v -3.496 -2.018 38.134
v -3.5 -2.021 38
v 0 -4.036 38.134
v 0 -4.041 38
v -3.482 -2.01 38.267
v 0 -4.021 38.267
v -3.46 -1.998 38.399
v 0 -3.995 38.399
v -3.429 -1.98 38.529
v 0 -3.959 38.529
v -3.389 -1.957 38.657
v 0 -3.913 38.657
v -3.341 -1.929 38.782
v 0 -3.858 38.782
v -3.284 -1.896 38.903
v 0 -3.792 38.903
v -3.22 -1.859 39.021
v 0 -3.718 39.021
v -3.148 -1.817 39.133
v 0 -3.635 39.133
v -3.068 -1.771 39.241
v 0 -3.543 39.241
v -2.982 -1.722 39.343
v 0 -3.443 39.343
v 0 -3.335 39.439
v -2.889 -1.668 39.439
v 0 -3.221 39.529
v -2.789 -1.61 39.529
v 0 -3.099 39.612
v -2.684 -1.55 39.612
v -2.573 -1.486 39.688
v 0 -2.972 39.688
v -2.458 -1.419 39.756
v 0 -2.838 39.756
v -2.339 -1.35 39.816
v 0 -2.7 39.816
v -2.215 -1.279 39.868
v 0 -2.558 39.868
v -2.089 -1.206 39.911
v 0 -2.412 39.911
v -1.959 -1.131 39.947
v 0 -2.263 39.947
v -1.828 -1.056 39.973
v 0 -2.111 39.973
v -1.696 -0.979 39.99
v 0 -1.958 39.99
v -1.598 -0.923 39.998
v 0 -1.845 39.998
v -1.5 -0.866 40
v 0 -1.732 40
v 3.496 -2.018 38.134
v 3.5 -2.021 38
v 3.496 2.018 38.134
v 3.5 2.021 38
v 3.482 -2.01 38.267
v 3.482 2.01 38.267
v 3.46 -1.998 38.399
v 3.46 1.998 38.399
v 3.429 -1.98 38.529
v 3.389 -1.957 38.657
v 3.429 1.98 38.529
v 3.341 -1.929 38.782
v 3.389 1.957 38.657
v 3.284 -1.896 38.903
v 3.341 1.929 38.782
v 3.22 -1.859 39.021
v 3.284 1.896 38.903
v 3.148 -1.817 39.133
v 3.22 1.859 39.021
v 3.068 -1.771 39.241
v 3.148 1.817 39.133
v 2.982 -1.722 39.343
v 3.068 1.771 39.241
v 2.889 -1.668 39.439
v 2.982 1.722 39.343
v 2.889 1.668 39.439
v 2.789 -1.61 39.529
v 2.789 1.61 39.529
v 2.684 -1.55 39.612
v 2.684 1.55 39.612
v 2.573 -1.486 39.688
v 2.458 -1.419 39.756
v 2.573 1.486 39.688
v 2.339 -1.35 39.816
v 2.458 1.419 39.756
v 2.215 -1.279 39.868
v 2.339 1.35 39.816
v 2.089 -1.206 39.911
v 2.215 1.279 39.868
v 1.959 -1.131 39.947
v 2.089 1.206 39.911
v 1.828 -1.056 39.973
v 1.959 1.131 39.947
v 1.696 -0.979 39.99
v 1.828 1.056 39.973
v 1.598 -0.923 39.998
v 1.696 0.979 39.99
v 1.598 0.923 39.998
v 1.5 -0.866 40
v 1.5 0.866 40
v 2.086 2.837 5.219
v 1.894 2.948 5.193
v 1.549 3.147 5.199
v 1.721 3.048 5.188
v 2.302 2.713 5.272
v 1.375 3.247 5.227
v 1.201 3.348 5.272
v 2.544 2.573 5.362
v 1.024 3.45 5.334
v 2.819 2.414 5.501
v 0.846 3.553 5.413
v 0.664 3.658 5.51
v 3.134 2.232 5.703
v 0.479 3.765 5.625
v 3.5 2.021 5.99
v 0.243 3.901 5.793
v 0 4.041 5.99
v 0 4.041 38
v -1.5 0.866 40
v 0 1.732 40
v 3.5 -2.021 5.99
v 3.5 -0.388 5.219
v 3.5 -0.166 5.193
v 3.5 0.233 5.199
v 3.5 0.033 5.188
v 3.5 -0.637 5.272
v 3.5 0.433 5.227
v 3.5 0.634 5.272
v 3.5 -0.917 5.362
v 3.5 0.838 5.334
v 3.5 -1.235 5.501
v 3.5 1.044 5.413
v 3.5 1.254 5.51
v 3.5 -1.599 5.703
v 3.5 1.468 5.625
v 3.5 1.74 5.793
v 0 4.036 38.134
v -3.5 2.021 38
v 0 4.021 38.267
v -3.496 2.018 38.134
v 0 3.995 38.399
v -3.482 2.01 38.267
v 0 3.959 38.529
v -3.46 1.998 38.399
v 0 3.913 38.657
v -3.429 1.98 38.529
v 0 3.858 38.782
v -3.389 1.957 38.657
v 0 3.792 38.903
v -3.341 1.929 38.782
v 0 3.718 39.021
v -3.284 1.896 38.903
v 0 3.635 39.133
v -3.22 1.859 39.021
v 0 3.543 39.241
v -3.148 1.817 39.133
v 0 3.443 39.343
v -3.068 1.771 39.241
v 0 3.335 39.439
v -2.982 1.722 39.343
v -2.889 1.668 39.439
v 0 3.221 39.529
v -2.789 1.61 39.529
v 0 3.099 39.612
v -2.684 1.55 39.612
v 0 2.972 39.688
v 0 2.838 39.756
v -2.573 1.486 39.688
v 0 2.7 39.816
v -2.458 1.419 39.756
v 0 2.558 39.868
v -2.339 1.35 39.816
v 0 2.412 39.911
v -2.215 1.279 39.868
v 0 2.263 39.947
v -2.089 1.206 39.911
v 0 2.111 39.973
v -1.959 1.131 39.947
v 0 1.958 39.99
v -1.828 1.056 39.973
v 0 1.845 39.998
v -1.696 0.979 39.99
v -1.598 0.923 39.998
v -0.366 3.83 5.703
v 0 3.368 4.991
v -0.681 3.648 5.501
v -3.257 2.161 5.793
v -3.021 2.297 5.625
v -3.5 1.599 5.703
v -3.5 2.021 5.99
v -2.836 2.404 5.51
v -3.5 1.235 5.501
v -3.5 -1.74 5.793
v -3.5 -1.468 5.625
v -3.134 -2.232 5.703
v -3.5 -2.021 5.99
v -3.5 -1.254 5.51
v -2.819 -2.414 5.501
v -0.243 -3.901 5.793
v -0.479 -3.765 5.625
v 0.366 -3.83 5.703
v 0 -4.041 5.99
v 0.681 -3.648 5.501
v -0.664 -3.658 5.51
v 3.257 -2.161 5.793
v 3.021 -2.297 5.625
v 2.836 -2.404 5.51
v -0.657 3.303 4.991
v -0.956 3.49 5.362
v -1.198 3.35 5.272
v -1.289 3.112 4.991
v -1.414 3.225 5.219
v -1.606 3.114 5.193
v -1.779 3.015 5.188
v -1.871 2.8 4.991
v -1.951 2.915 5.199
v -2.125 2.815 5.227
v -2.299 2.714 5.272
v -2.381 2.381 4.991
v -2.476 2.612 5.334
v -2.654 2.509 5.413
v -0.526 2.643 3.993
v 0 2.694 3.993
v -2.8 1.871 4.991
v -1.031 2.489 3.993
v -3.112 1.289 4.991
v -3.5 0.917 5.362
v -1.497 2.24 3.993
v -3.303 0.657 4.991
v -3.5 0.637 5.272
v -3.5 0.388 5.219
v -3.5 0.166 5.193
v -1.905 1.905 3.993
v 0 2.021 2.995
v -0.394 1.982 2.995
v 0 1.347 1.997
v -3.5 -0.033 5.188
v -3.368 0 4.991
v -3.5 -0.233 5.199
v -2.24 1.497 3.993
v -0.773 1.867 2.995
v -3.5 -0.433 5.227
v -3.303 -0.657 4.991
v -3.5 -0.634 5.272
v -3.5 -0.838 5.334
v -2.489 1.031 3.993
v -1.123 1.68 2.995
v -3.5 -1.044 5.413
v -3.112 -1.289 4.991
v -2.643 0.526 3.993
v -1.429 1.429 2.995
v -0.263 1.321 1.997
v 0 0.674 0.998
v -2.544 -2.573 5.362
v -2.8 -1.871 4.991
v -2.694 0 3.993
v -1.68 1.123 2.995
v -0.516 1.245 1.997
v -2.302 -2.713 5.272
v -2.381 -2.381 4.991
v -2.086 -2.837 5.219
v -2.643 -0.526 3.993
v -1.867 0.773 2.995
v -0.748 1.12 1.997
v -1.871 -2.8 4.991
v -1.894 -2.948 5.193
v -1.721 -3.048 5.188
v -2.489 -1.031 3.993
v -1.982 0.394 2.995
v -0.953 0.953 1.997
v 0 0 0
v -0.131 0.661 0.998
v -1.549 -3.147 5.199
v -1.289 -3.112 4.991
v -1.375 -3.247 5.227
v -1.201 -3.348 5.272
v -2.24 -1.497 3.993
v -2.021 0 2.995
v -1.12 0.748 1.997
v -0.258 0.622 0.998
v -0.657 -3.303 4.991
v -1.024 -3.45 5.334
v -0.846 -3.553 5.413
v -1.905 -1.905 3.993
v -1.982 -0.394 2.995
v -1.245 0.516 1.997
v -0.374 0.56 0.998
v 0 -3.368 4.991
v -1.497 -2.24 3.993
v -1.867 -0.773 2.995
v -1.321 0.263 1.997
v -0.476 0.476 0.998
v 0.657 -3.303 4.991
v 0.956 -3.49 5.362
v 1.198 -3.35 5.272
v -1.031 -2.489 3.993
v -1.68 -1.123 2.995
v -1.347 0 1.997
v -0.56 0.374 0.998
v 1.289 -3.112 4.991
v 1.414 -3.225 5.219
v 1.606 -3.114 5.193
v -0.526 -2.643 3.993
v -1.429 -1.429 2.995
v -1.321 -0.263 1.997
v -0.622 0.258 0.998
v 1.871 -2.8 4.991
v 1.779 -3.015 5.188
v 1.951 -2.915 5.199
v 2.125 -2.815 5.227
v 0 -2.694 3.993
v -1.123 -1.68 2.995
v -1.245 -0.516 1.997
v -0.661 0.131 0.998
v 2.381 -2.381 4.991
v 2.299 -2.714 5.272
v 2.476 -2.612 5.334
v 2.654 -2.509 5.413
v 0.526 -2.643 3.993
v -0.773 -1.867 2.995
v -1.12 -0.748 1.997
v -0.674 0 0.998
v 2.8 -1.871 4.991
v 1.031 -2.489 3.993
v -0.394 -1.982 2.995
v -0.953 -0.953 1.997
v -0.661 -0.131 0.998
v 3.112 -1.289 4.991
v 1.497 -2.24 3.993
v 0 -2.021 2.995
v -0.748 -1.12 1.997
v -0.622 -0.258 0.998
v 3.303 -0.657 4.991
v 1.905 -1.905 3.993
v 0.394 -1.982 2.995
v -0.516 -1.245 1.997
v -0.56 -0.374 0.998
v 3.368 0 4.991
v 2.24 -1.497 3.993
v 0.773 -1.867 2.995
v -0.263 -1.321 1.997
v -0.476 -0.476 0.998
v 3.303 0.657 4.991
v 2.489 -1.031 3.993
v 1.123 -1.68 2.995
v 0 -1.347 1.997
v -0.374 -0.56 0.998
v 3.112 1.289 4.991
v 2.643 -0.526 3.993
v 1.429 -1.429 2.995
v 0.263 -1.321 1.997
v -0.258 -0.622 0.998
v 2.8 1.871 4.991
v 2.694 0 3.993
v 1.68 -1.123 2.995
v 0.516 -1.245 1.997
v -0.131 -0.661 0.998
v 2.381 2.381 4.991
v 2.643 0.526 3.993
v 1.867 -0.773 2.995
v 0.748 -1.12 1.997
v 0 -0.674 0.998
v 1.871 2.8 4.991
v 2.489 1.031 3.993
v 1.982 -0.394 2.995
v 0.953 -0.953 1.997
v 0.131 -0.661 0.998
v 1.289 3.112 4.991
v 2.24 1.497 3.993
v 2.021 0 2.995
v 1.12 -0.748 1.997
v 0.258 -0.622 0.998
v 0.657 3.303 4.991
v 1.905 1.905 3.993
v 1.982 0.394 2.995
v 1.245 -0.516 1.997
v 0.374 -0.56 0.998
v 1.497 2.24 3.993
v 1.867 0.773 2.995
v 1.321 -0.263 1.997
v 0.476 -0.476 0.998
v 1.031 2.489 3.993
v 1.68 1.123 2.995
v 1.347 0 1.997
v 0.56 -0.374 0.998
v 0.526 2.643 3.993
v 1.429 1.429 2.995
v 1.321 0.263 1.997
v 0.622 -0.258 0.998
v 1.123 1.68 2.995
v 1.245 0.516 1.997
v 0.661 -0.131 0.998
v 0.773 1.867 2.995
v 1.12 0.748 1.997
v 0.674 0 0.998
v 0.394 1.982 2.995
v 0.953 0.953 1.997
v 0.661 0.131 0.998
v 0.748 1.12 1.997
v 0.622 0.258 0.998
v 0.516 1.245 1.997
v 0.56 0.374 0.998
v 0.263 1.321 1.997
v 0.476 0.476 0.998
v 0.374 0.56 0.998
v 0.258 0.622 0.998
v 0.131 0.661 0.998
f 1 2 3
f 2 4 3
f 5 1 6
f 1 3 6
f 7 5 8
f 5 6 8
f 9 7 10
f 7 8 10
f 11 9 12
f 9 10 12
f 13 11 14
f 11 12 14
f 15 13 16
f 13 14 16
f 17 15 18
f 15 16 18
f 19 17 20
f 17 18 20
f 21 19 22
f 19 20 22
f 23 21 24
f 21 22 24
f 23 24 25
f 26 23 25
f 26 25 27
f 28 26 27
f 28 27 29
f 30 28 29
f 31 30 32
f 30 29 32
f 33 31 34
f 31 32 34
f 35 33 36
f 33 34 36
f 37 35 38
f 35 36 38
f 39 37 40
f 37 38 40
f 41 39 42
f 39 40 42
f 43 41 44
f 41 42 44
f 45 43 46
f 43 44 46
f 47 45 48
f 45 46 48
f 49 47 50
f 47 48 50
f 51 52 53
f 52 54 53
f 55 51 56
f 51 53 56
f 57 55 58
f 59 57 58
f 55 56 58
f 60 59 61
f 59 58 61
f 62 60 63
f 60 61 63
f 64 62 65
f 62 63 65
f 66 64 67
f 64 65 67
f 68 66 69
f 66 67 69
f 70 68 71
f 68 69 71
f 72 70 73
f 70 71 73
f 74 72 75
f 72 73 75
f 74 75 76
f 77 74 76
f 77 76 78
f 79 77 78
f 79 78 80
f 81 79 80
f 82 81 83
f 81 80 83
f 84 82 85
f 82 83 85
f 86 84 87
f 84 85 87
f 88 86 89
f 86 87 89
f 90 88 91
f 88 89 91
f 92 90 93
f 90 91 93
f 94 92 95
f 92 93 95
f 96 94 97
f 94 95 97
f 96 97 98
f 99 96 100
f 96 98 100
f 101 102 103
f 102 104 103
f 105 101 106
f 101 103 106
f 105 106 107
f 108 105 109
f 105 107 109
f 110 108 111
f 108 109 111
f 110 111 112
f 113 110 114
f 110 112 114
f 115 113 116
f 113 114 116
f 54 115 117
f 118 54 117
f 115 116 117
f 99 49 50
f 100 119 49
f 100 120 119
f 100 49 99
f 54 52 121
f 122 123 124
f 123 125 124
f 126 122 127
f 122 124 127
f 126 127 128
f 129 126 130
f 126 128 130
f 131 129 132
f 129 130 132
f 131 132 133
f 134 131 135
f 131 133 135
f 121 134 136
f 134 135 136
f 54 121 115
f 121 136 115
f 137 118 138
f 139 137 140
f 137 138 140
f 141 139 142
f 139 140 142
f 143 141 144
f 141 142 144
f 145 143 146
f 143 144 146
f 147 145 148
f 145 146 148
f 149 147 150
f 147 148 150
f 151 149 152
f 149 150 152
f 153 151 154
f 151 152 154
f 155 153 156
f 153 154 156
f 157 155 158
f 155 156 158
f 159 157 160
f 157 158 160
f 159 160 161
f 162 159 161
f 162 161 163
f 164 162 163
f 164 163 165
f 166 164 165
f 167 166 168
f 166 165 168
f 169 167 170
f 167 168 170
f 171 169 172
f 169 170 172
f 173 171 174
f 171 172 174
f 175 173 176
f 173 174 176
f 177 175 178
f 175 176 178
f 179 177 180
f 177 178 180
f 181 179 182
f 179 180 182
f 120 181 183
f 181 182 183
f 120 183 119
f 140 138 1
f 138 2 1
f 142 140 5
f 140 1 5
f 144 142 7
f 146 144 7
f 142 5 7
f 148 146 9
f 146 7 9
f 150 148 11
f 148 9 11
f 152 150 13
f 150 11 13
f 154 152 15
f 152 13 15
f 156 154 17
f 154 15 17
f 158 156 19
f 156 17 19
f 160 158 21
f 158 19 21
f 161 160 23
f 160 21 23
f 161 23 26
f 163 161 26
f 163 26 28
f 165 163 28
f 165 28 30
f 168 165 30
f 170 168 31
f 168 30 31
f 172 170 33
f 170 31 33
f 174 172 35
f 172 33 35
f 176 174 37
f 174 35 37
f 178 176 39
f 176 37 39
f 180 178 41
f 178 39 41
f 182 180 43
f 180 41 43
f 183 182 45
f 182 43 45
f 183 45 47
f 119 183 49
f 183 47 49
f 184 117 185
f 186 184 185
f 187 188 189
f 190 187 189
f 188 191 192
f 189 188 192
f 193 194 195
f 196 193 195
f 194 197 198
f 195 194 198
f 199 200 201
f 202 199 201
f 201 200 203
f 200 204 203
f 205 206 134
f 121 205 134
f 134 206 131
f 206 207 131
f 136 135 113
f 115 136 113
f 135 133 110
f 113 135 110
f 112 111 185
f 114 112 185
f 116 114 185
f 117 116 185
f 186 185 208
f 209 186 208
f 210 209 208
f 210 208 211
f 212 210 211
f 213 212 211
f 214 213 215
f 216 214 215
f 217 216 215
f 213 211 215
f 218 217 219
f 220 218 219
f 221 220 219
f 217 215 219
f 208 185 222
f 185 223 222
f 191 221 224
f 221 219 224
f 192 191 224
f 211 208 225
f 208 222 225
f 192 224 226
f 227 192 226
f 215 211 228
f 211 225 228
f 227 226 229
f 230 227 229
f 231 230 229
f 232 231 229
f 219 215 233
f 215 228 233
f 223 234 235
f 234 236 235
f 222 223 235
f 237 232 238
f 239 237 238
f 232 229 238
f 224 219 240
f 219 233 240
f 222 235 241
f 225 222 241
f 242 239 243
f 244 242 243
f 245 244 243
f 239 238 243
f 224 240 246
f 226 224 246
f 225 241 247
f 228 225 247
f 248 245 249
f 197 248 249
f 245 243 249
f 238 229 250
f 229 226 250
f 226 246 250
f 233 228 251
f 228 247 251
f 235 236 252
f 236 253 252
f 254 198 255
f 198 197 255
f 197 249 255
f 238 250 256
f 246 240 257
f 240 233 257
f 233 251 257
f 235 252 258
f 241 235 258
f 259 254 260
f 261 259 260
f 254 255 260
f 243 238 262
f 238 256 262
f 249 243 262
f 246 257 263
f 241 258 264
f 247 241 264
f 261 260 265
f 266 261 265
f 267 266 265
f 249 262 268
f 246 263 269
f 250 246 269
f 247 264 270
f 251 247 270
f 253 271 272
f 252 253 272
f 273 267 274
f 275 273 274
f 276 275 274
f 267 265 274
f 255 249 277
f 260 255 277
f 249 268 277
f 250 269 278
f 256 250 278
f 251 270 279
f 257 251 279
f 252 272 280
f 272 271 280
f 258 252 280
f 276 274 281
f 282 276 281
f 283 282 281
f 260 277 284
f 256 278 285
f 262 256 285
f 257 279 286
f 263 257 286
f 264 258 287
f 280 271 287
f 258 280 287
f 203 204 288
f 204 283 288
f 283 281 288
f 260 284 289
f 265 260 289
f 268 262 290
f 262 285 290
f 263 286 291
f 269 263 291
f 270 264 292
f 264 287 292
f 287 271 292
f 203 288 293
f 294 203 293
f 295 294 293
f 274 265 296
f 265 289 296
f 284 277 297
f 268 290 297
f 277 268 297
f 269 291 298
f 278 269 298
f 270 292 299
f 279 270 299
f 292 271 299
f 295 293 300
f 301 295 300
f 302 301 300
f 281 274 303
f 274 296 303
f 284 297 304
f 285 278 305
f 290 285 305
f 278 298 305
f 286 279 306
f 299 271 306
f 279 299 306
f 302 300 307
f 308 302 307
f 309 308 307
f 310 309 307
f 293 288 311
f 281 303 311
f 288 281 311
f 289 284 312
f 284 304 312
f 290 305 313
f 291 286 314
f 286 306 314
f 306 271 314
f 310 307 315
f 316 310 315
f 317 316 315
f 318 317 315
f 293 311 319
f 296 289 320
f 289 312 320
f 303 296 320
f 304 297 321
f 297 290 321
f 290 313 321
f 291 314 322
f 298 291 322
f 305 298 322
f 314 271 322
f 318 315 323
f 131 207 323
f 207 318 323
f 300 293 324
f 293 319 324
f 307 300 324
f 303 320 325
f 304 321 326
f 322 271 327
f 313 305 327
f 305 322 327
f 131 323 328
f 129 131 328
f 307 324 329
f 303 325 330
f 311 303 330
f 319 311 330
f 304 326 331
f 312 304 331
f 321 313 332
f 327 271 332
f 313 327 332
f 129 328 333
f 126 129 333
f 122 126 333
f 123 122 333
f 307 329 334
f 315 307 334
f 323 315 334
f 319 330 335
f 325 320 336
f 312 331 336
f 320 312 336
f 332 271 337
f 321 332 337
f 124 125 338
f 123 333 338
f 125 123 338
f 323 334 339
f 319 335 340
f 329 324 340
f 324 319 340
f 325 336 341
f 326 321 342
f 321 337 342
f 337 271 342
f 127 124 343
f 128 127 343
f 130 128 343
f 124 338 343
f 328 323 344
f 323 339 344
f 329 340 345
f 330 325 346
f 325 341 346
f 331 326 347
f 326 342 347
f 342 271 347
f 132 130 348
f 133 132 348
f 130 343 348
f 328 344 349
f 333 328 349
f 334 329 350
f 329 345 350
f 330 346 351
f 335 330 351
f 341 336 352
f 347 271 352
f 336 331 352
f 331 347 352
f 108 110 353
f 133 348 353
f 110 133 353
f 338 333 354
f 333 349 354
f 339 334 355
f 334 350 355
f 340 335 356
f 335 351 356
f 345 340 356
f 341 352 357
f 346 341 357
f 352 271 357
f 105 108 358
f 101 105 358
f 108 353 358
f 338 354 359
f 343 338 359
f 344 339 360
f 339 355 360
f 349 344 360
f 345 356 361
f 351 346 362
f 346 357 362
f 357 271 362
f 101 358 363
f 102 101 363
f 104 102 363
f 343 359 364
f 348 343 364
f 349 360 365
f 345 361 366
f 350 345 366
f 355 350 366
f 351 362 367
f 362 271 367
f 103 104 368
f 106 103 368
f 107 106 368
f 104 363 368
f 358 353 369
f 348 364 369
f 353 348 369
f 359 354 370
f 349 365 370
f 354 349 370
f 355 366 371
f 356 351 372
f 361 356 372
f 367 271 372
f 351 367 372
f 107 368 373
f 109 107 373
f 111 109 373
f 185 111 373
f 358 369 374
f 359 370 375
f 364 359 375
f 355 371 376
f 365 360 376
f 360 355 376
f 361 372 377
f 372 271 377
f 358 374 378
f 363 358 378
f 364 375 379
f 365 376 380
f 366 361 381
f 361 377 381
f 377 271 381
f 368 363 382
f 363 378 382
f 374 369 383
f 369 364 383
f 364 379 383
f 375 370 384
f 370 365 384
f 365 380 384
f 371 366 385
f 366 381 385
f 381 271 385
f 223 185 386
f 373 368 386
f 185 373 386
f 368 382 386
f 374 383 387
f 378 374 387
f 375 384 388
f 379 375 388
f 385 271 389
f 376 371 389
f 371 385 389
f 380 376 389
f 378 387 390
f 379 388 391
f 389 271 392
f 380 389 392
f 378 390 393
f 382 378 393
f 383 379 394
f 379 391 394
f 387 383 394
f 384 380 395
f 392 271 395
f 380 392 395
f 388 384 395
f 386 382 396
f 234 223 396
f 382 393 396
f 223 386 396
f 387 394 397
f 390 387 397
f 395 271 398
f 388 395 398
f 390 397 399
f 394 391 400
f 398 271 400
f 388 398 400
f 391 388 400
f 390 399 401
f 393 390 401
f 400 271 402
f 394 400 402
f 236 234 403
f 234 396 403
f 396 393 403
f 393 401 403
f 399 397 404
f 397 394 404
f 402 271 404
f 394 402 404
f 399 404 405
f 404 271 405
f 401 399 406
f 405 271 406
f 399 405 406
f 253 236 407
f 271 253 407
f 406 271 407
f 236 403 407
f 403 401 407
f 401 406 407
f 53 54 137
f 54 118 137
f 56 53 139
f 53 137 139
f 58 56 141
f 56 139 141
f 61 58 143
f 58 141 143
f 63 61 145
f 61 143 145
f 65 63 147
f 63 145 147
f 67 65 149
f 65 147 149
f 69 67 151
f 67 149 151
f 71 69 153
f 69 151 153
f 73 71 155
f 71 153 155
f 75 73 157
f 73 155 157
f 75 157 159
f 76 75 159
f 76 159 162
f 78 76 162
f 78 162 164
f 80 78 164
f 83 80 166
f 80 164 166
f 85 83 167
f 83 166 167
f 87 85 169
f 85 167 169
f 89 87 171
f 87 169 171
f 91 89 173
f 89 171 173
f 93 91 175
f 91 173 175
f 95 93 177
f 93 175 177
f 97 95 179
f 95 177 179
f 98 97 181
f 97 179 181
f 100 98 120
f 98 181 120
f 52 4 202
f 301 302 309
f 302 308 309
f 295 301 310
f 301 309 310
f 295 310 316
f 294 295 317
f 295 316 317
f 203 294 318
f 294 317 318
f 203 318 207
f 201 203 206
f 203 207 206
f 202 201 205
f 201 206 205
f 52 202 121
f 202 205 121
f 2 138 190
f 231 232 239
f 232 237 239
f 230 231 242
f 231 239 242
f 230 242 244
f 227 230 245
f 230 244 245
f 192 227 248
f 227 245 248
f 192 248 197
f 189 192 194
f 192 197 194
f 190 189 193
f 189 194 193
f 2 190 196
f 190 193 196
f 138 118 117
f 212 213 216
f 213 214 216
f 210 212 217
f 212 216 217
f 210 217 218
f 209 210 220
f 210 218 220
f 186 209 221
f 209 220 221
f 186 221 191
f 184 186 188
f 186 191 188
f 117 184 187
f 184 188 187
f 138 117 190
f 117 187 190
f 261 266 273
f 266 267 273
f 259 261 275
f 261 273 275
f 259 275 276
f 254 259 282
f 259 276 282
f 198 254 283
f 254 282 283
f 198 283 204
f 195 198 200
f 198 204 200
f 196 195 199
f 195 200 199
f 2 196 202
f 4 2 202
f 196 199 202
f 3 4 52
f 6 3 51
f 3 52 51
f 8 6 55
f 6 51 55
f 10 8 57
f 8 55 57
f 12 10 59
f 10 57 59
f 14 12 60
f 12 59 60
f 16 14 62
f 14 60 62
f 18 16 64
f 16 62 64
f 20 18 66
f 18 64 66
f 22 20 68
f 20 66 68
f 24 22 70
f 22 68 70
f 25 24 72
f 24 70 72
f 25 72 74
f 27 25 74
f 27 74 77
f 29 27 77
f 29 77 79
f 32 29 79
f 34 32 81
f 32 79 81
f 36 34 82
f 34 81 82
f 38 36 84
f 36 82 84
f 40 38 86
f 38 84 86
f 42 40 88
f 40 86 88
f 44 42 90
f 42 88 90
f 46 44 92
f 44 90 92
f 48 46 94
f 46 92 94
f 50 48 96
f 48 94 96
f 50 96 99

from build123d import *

# Parameters (mm, degrees)
F1_DEPTH = 40
F2_R     = 2


with BuildPart() as f1:
    # F0 (on Top) → F1 (new body)
    with BuildSketch(Plane.XY):
        Polygon((-3.5, 2.020726), (-3.5, -2.020726), (0, -4.041452), (3.5, -2.020726), (3.5, 2.020726), (0, 4.041452), align=None)
    extrude(amount=F1_DEPTH)

    # F2
    f2_edges = [f1.edges().sort_by_distance(p)[0] for p in [
        (-3.5, 0, 40),
        (-1.75, -3.031089, 40),
        (1.75, -3.031089, 40),
        (3.5, 0, 40),
        (1.75, 3.031089, 40),
        (-1.75, 3.031089, 40),
    ]]
    fillet(f2_edges, radius=F2_R)

    # F3 (on Right) → F4 (revolve, cut)
    with BuildSketch(Plane.YZ):
        Polygon((11.752745, 17.418522), (0, 0), (0, -5.376646), (19.7981, -5.376646), (22.114186, 17.418522), align=None)
    revolve(axis=Axis((0, 0, -2.688323), (0, 0, 1)), mode=Mode.SUBTRACT)


solid = f1.part
